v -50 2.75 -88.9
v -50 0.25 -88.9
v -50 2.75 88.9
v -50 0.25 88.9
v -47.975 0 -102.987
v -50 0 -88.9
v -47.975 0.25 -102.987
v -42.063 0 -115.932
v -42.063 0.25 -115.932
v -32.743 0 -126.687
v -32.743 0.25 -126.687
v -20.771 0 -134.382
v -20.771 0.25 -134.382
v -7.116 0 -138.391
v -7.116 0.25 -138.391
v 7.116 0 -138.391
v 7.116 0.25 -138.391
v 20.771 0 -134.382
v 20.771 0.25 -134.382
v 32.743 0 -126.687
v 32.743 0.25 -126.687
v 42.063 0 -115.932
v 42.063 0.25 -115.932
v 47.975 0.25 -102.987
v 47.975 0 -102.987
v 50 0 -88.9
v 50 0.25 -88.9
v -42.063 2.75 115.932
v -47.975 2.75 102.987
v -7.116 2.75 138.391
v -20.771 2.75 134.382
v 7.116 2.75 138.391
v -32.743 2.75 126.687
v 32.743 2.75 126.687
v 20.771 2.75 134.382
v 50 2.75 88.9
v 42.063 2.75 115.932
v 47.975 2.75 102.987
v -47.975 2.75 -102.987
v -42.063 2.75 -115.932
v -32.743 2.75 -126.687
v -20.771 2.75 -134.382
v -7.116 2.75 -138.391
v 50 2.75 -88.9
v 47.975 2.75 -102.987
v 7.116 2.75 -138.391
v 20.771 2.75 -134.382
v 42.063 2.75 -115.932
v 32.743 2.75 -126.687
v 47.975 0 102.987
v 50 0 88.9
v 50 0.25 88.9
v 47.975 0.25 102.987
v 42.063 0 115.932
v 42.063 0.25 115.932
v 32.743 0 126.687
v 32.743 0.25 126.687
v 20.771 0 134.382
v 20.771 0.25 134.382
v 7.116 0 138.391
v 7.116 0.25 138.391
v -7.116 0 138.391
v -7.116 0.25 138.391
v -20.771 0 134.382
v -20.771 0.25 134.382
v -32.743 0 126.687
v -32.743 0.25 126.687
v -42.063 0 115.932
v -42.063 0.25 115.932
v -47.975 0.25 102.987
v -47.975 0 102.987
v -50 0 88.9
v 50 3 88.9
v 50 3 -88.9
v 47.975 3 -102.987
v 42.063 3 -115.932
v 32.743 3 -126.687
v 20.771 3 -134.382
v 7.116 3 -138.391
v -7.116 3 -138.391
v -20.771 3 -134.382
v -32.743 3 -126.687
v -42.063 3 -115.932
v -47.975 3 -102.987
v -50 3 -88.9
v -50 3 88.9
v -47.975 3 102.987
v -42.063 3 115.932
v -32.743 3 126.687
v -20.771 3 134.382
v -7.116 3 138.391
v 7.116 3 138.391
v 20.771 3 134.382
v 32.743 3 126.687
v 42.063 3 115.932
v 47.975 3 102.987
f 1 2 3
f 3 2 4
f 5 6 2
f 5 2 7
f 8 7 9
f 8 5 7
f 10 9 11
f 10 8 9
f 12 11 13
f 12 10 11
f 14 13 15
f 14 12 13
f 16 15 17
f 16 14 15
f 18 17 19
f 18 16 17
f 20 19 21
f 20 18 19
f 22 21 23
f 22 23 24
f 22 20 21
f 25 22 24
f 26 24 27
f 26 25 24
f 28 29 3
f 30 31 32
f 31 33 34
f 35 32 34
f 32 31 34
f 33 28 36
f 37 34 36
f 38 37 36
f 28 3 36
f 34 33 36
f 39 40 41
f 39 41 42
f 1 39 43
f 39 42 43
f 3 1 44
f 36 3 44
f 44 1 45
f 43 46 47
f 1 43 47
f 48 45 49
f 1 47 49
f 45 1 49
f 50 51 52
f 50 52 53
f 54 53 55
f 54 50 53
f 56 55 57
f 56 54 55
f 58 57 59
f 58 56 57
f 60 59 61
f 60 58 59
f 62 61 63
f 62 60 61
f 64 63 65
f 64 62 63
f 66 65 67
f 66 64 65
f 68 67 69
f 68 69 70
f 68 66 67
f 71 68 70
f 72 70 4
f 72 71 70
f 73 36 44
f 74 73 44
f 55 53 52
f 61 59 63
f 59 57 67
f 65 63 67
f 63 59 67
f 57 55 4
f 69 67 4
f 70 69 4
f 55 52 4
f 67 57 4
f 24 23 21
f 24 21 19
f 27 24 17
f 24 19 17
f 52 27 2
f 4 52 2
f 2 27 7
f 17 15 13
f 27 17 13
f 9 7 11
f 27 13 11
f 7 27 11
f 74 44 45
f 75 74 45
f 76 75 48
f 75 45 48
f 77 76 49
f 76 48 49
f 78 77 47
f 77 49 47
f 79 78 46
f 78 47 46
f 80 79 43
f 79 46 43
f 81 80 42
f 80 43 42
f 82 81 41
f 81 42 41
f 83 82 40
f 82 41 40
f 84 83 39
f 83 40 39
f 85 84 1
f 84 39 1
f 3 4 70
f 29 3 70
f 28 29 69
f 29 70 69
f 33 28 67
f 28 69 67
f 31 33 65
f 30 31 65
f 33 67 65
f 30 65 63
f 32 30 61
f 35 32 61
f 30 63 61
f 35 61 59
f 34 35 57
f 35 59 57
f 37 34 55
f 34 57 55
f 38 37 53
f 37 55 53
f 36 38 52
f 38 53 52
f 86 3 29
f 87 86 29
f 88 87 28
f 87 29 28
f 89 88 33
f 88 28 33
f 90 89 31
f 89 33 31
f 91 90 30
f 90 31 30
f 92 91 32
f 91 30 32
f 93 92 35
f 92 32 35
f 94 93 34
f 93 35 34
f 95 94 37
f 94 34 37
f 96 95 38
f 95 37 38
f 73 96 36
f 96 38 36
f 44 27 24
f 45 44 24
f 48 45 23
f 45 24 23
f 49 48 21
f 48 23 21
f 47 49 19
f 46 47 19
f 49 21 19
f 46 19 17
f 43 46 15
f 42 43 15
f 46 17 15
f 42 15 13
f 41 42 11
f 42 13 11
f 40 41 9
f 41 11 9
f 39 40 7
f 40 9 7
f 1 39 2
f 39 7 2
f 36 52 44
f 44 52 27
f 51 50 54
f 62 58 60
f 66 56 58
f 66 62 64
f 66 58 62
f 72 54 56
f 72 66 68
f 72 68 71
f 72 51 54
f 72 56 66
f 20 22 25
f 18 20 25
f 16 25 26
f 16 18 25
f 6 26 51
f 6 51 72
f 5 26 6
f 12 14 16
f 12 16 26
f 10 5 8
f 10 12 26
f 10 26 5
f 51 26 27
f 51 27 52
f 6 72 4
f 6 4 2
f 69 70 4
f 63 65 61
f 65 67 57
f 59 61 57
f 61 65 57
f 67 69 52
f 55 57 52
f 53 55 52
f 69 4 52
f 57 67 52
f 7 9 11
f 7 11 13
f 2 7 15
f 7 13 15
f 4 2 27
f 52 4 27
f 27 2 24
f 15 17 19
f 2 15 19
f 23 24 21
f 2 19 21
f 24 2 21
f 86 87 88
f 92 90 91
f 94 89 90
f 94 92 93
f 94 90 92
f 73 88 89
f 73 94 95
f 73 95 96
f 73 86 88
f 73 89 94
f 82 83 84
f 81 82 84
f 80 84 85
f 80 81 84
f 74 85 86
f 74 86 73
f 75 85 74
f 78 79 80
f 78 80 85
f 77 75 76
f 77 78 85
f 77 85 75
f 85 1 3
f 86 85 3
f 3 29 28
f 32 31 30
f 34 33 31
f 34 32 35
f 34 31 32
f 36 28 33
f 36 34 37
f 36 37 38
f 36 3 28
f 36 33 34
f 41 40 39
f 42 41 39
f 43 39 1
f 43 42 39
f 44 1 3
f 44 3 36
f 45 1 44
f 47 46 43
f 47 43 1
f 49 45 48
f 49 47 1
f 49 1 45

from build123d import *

# Parameters (mm, degrees)
BOSS_EXTRUDE1_DEPTH = 0.25
BOSS_EXTRUDE6_DEPTH = 2.5
BOSS_EXTRUDE7_DEPTH = 0.25


with BuildPart() as part:
    # Sketch1 → Boss-Extrude1 (new body)
    with BuildSketch(Plane(origin=(0, 0, 0), x_dir=(1, 0, 0), z_dir=(0, 1, 0))):
        with BuildLine():
            Line((50, 88.9), (50, -88.9))
            ThreePointArc((50, -88.9), (0, -138.9), (-50, -88.9))
            Line((-50, -88.9), (-50, 88.9))
            ThreePointArc((-50, 88.9), (0, 138.9), (50, 88.9))
        make_face()
    extrude(amount=BOSS_EXTRUDE1_DEPTH)


with BuildPart() as body_2:
    # Sketch5 → Boss-Extrude6 (new body)
    with BuildSketch(Plane(origin=(0, 0.25, 0), x_dir=(1, 0, 0), z_dir=(0, 1, 0))):
        with BuildLine():
            Line((-50, 88.9), (-50, -88.9))
            ThreePointArc((-50, -88.9), (0, -138.9), (50, -88.9))
            Line((50, -88.9), (50, 88.9))
            ThreePointArc((50, 88.9), (0, 138.9), (-50, 88.9))
        make_face()
    extrude(amount=BOSS_EXTRUDE6_DEPTH)


with BuildPart() as body_3:
    # Sketch6 → Boss-Extrude7 (new body)
    with BuildSketch(Plane(origin=(0, 2.75, 0), x_dir=(1, 0, 0), z_dir=(0, 1, 0))):
        with BuildLine():
            Line((-50, 88.9), (-50, -88.9))
            ThreePointArc((-50, -88.9), (0, -138.9), (50, -88.9))
            Line((50, -88.9), (50, 88.9))
            ThreePointArc((50, 88.9), (0, 138.9), (-50, 88.9))
        make_face()
    extrude(amount=BOSS_EXTRUDE7_DEPTH)


solid = Compound([part.part, body_2.part, body_3.part])
